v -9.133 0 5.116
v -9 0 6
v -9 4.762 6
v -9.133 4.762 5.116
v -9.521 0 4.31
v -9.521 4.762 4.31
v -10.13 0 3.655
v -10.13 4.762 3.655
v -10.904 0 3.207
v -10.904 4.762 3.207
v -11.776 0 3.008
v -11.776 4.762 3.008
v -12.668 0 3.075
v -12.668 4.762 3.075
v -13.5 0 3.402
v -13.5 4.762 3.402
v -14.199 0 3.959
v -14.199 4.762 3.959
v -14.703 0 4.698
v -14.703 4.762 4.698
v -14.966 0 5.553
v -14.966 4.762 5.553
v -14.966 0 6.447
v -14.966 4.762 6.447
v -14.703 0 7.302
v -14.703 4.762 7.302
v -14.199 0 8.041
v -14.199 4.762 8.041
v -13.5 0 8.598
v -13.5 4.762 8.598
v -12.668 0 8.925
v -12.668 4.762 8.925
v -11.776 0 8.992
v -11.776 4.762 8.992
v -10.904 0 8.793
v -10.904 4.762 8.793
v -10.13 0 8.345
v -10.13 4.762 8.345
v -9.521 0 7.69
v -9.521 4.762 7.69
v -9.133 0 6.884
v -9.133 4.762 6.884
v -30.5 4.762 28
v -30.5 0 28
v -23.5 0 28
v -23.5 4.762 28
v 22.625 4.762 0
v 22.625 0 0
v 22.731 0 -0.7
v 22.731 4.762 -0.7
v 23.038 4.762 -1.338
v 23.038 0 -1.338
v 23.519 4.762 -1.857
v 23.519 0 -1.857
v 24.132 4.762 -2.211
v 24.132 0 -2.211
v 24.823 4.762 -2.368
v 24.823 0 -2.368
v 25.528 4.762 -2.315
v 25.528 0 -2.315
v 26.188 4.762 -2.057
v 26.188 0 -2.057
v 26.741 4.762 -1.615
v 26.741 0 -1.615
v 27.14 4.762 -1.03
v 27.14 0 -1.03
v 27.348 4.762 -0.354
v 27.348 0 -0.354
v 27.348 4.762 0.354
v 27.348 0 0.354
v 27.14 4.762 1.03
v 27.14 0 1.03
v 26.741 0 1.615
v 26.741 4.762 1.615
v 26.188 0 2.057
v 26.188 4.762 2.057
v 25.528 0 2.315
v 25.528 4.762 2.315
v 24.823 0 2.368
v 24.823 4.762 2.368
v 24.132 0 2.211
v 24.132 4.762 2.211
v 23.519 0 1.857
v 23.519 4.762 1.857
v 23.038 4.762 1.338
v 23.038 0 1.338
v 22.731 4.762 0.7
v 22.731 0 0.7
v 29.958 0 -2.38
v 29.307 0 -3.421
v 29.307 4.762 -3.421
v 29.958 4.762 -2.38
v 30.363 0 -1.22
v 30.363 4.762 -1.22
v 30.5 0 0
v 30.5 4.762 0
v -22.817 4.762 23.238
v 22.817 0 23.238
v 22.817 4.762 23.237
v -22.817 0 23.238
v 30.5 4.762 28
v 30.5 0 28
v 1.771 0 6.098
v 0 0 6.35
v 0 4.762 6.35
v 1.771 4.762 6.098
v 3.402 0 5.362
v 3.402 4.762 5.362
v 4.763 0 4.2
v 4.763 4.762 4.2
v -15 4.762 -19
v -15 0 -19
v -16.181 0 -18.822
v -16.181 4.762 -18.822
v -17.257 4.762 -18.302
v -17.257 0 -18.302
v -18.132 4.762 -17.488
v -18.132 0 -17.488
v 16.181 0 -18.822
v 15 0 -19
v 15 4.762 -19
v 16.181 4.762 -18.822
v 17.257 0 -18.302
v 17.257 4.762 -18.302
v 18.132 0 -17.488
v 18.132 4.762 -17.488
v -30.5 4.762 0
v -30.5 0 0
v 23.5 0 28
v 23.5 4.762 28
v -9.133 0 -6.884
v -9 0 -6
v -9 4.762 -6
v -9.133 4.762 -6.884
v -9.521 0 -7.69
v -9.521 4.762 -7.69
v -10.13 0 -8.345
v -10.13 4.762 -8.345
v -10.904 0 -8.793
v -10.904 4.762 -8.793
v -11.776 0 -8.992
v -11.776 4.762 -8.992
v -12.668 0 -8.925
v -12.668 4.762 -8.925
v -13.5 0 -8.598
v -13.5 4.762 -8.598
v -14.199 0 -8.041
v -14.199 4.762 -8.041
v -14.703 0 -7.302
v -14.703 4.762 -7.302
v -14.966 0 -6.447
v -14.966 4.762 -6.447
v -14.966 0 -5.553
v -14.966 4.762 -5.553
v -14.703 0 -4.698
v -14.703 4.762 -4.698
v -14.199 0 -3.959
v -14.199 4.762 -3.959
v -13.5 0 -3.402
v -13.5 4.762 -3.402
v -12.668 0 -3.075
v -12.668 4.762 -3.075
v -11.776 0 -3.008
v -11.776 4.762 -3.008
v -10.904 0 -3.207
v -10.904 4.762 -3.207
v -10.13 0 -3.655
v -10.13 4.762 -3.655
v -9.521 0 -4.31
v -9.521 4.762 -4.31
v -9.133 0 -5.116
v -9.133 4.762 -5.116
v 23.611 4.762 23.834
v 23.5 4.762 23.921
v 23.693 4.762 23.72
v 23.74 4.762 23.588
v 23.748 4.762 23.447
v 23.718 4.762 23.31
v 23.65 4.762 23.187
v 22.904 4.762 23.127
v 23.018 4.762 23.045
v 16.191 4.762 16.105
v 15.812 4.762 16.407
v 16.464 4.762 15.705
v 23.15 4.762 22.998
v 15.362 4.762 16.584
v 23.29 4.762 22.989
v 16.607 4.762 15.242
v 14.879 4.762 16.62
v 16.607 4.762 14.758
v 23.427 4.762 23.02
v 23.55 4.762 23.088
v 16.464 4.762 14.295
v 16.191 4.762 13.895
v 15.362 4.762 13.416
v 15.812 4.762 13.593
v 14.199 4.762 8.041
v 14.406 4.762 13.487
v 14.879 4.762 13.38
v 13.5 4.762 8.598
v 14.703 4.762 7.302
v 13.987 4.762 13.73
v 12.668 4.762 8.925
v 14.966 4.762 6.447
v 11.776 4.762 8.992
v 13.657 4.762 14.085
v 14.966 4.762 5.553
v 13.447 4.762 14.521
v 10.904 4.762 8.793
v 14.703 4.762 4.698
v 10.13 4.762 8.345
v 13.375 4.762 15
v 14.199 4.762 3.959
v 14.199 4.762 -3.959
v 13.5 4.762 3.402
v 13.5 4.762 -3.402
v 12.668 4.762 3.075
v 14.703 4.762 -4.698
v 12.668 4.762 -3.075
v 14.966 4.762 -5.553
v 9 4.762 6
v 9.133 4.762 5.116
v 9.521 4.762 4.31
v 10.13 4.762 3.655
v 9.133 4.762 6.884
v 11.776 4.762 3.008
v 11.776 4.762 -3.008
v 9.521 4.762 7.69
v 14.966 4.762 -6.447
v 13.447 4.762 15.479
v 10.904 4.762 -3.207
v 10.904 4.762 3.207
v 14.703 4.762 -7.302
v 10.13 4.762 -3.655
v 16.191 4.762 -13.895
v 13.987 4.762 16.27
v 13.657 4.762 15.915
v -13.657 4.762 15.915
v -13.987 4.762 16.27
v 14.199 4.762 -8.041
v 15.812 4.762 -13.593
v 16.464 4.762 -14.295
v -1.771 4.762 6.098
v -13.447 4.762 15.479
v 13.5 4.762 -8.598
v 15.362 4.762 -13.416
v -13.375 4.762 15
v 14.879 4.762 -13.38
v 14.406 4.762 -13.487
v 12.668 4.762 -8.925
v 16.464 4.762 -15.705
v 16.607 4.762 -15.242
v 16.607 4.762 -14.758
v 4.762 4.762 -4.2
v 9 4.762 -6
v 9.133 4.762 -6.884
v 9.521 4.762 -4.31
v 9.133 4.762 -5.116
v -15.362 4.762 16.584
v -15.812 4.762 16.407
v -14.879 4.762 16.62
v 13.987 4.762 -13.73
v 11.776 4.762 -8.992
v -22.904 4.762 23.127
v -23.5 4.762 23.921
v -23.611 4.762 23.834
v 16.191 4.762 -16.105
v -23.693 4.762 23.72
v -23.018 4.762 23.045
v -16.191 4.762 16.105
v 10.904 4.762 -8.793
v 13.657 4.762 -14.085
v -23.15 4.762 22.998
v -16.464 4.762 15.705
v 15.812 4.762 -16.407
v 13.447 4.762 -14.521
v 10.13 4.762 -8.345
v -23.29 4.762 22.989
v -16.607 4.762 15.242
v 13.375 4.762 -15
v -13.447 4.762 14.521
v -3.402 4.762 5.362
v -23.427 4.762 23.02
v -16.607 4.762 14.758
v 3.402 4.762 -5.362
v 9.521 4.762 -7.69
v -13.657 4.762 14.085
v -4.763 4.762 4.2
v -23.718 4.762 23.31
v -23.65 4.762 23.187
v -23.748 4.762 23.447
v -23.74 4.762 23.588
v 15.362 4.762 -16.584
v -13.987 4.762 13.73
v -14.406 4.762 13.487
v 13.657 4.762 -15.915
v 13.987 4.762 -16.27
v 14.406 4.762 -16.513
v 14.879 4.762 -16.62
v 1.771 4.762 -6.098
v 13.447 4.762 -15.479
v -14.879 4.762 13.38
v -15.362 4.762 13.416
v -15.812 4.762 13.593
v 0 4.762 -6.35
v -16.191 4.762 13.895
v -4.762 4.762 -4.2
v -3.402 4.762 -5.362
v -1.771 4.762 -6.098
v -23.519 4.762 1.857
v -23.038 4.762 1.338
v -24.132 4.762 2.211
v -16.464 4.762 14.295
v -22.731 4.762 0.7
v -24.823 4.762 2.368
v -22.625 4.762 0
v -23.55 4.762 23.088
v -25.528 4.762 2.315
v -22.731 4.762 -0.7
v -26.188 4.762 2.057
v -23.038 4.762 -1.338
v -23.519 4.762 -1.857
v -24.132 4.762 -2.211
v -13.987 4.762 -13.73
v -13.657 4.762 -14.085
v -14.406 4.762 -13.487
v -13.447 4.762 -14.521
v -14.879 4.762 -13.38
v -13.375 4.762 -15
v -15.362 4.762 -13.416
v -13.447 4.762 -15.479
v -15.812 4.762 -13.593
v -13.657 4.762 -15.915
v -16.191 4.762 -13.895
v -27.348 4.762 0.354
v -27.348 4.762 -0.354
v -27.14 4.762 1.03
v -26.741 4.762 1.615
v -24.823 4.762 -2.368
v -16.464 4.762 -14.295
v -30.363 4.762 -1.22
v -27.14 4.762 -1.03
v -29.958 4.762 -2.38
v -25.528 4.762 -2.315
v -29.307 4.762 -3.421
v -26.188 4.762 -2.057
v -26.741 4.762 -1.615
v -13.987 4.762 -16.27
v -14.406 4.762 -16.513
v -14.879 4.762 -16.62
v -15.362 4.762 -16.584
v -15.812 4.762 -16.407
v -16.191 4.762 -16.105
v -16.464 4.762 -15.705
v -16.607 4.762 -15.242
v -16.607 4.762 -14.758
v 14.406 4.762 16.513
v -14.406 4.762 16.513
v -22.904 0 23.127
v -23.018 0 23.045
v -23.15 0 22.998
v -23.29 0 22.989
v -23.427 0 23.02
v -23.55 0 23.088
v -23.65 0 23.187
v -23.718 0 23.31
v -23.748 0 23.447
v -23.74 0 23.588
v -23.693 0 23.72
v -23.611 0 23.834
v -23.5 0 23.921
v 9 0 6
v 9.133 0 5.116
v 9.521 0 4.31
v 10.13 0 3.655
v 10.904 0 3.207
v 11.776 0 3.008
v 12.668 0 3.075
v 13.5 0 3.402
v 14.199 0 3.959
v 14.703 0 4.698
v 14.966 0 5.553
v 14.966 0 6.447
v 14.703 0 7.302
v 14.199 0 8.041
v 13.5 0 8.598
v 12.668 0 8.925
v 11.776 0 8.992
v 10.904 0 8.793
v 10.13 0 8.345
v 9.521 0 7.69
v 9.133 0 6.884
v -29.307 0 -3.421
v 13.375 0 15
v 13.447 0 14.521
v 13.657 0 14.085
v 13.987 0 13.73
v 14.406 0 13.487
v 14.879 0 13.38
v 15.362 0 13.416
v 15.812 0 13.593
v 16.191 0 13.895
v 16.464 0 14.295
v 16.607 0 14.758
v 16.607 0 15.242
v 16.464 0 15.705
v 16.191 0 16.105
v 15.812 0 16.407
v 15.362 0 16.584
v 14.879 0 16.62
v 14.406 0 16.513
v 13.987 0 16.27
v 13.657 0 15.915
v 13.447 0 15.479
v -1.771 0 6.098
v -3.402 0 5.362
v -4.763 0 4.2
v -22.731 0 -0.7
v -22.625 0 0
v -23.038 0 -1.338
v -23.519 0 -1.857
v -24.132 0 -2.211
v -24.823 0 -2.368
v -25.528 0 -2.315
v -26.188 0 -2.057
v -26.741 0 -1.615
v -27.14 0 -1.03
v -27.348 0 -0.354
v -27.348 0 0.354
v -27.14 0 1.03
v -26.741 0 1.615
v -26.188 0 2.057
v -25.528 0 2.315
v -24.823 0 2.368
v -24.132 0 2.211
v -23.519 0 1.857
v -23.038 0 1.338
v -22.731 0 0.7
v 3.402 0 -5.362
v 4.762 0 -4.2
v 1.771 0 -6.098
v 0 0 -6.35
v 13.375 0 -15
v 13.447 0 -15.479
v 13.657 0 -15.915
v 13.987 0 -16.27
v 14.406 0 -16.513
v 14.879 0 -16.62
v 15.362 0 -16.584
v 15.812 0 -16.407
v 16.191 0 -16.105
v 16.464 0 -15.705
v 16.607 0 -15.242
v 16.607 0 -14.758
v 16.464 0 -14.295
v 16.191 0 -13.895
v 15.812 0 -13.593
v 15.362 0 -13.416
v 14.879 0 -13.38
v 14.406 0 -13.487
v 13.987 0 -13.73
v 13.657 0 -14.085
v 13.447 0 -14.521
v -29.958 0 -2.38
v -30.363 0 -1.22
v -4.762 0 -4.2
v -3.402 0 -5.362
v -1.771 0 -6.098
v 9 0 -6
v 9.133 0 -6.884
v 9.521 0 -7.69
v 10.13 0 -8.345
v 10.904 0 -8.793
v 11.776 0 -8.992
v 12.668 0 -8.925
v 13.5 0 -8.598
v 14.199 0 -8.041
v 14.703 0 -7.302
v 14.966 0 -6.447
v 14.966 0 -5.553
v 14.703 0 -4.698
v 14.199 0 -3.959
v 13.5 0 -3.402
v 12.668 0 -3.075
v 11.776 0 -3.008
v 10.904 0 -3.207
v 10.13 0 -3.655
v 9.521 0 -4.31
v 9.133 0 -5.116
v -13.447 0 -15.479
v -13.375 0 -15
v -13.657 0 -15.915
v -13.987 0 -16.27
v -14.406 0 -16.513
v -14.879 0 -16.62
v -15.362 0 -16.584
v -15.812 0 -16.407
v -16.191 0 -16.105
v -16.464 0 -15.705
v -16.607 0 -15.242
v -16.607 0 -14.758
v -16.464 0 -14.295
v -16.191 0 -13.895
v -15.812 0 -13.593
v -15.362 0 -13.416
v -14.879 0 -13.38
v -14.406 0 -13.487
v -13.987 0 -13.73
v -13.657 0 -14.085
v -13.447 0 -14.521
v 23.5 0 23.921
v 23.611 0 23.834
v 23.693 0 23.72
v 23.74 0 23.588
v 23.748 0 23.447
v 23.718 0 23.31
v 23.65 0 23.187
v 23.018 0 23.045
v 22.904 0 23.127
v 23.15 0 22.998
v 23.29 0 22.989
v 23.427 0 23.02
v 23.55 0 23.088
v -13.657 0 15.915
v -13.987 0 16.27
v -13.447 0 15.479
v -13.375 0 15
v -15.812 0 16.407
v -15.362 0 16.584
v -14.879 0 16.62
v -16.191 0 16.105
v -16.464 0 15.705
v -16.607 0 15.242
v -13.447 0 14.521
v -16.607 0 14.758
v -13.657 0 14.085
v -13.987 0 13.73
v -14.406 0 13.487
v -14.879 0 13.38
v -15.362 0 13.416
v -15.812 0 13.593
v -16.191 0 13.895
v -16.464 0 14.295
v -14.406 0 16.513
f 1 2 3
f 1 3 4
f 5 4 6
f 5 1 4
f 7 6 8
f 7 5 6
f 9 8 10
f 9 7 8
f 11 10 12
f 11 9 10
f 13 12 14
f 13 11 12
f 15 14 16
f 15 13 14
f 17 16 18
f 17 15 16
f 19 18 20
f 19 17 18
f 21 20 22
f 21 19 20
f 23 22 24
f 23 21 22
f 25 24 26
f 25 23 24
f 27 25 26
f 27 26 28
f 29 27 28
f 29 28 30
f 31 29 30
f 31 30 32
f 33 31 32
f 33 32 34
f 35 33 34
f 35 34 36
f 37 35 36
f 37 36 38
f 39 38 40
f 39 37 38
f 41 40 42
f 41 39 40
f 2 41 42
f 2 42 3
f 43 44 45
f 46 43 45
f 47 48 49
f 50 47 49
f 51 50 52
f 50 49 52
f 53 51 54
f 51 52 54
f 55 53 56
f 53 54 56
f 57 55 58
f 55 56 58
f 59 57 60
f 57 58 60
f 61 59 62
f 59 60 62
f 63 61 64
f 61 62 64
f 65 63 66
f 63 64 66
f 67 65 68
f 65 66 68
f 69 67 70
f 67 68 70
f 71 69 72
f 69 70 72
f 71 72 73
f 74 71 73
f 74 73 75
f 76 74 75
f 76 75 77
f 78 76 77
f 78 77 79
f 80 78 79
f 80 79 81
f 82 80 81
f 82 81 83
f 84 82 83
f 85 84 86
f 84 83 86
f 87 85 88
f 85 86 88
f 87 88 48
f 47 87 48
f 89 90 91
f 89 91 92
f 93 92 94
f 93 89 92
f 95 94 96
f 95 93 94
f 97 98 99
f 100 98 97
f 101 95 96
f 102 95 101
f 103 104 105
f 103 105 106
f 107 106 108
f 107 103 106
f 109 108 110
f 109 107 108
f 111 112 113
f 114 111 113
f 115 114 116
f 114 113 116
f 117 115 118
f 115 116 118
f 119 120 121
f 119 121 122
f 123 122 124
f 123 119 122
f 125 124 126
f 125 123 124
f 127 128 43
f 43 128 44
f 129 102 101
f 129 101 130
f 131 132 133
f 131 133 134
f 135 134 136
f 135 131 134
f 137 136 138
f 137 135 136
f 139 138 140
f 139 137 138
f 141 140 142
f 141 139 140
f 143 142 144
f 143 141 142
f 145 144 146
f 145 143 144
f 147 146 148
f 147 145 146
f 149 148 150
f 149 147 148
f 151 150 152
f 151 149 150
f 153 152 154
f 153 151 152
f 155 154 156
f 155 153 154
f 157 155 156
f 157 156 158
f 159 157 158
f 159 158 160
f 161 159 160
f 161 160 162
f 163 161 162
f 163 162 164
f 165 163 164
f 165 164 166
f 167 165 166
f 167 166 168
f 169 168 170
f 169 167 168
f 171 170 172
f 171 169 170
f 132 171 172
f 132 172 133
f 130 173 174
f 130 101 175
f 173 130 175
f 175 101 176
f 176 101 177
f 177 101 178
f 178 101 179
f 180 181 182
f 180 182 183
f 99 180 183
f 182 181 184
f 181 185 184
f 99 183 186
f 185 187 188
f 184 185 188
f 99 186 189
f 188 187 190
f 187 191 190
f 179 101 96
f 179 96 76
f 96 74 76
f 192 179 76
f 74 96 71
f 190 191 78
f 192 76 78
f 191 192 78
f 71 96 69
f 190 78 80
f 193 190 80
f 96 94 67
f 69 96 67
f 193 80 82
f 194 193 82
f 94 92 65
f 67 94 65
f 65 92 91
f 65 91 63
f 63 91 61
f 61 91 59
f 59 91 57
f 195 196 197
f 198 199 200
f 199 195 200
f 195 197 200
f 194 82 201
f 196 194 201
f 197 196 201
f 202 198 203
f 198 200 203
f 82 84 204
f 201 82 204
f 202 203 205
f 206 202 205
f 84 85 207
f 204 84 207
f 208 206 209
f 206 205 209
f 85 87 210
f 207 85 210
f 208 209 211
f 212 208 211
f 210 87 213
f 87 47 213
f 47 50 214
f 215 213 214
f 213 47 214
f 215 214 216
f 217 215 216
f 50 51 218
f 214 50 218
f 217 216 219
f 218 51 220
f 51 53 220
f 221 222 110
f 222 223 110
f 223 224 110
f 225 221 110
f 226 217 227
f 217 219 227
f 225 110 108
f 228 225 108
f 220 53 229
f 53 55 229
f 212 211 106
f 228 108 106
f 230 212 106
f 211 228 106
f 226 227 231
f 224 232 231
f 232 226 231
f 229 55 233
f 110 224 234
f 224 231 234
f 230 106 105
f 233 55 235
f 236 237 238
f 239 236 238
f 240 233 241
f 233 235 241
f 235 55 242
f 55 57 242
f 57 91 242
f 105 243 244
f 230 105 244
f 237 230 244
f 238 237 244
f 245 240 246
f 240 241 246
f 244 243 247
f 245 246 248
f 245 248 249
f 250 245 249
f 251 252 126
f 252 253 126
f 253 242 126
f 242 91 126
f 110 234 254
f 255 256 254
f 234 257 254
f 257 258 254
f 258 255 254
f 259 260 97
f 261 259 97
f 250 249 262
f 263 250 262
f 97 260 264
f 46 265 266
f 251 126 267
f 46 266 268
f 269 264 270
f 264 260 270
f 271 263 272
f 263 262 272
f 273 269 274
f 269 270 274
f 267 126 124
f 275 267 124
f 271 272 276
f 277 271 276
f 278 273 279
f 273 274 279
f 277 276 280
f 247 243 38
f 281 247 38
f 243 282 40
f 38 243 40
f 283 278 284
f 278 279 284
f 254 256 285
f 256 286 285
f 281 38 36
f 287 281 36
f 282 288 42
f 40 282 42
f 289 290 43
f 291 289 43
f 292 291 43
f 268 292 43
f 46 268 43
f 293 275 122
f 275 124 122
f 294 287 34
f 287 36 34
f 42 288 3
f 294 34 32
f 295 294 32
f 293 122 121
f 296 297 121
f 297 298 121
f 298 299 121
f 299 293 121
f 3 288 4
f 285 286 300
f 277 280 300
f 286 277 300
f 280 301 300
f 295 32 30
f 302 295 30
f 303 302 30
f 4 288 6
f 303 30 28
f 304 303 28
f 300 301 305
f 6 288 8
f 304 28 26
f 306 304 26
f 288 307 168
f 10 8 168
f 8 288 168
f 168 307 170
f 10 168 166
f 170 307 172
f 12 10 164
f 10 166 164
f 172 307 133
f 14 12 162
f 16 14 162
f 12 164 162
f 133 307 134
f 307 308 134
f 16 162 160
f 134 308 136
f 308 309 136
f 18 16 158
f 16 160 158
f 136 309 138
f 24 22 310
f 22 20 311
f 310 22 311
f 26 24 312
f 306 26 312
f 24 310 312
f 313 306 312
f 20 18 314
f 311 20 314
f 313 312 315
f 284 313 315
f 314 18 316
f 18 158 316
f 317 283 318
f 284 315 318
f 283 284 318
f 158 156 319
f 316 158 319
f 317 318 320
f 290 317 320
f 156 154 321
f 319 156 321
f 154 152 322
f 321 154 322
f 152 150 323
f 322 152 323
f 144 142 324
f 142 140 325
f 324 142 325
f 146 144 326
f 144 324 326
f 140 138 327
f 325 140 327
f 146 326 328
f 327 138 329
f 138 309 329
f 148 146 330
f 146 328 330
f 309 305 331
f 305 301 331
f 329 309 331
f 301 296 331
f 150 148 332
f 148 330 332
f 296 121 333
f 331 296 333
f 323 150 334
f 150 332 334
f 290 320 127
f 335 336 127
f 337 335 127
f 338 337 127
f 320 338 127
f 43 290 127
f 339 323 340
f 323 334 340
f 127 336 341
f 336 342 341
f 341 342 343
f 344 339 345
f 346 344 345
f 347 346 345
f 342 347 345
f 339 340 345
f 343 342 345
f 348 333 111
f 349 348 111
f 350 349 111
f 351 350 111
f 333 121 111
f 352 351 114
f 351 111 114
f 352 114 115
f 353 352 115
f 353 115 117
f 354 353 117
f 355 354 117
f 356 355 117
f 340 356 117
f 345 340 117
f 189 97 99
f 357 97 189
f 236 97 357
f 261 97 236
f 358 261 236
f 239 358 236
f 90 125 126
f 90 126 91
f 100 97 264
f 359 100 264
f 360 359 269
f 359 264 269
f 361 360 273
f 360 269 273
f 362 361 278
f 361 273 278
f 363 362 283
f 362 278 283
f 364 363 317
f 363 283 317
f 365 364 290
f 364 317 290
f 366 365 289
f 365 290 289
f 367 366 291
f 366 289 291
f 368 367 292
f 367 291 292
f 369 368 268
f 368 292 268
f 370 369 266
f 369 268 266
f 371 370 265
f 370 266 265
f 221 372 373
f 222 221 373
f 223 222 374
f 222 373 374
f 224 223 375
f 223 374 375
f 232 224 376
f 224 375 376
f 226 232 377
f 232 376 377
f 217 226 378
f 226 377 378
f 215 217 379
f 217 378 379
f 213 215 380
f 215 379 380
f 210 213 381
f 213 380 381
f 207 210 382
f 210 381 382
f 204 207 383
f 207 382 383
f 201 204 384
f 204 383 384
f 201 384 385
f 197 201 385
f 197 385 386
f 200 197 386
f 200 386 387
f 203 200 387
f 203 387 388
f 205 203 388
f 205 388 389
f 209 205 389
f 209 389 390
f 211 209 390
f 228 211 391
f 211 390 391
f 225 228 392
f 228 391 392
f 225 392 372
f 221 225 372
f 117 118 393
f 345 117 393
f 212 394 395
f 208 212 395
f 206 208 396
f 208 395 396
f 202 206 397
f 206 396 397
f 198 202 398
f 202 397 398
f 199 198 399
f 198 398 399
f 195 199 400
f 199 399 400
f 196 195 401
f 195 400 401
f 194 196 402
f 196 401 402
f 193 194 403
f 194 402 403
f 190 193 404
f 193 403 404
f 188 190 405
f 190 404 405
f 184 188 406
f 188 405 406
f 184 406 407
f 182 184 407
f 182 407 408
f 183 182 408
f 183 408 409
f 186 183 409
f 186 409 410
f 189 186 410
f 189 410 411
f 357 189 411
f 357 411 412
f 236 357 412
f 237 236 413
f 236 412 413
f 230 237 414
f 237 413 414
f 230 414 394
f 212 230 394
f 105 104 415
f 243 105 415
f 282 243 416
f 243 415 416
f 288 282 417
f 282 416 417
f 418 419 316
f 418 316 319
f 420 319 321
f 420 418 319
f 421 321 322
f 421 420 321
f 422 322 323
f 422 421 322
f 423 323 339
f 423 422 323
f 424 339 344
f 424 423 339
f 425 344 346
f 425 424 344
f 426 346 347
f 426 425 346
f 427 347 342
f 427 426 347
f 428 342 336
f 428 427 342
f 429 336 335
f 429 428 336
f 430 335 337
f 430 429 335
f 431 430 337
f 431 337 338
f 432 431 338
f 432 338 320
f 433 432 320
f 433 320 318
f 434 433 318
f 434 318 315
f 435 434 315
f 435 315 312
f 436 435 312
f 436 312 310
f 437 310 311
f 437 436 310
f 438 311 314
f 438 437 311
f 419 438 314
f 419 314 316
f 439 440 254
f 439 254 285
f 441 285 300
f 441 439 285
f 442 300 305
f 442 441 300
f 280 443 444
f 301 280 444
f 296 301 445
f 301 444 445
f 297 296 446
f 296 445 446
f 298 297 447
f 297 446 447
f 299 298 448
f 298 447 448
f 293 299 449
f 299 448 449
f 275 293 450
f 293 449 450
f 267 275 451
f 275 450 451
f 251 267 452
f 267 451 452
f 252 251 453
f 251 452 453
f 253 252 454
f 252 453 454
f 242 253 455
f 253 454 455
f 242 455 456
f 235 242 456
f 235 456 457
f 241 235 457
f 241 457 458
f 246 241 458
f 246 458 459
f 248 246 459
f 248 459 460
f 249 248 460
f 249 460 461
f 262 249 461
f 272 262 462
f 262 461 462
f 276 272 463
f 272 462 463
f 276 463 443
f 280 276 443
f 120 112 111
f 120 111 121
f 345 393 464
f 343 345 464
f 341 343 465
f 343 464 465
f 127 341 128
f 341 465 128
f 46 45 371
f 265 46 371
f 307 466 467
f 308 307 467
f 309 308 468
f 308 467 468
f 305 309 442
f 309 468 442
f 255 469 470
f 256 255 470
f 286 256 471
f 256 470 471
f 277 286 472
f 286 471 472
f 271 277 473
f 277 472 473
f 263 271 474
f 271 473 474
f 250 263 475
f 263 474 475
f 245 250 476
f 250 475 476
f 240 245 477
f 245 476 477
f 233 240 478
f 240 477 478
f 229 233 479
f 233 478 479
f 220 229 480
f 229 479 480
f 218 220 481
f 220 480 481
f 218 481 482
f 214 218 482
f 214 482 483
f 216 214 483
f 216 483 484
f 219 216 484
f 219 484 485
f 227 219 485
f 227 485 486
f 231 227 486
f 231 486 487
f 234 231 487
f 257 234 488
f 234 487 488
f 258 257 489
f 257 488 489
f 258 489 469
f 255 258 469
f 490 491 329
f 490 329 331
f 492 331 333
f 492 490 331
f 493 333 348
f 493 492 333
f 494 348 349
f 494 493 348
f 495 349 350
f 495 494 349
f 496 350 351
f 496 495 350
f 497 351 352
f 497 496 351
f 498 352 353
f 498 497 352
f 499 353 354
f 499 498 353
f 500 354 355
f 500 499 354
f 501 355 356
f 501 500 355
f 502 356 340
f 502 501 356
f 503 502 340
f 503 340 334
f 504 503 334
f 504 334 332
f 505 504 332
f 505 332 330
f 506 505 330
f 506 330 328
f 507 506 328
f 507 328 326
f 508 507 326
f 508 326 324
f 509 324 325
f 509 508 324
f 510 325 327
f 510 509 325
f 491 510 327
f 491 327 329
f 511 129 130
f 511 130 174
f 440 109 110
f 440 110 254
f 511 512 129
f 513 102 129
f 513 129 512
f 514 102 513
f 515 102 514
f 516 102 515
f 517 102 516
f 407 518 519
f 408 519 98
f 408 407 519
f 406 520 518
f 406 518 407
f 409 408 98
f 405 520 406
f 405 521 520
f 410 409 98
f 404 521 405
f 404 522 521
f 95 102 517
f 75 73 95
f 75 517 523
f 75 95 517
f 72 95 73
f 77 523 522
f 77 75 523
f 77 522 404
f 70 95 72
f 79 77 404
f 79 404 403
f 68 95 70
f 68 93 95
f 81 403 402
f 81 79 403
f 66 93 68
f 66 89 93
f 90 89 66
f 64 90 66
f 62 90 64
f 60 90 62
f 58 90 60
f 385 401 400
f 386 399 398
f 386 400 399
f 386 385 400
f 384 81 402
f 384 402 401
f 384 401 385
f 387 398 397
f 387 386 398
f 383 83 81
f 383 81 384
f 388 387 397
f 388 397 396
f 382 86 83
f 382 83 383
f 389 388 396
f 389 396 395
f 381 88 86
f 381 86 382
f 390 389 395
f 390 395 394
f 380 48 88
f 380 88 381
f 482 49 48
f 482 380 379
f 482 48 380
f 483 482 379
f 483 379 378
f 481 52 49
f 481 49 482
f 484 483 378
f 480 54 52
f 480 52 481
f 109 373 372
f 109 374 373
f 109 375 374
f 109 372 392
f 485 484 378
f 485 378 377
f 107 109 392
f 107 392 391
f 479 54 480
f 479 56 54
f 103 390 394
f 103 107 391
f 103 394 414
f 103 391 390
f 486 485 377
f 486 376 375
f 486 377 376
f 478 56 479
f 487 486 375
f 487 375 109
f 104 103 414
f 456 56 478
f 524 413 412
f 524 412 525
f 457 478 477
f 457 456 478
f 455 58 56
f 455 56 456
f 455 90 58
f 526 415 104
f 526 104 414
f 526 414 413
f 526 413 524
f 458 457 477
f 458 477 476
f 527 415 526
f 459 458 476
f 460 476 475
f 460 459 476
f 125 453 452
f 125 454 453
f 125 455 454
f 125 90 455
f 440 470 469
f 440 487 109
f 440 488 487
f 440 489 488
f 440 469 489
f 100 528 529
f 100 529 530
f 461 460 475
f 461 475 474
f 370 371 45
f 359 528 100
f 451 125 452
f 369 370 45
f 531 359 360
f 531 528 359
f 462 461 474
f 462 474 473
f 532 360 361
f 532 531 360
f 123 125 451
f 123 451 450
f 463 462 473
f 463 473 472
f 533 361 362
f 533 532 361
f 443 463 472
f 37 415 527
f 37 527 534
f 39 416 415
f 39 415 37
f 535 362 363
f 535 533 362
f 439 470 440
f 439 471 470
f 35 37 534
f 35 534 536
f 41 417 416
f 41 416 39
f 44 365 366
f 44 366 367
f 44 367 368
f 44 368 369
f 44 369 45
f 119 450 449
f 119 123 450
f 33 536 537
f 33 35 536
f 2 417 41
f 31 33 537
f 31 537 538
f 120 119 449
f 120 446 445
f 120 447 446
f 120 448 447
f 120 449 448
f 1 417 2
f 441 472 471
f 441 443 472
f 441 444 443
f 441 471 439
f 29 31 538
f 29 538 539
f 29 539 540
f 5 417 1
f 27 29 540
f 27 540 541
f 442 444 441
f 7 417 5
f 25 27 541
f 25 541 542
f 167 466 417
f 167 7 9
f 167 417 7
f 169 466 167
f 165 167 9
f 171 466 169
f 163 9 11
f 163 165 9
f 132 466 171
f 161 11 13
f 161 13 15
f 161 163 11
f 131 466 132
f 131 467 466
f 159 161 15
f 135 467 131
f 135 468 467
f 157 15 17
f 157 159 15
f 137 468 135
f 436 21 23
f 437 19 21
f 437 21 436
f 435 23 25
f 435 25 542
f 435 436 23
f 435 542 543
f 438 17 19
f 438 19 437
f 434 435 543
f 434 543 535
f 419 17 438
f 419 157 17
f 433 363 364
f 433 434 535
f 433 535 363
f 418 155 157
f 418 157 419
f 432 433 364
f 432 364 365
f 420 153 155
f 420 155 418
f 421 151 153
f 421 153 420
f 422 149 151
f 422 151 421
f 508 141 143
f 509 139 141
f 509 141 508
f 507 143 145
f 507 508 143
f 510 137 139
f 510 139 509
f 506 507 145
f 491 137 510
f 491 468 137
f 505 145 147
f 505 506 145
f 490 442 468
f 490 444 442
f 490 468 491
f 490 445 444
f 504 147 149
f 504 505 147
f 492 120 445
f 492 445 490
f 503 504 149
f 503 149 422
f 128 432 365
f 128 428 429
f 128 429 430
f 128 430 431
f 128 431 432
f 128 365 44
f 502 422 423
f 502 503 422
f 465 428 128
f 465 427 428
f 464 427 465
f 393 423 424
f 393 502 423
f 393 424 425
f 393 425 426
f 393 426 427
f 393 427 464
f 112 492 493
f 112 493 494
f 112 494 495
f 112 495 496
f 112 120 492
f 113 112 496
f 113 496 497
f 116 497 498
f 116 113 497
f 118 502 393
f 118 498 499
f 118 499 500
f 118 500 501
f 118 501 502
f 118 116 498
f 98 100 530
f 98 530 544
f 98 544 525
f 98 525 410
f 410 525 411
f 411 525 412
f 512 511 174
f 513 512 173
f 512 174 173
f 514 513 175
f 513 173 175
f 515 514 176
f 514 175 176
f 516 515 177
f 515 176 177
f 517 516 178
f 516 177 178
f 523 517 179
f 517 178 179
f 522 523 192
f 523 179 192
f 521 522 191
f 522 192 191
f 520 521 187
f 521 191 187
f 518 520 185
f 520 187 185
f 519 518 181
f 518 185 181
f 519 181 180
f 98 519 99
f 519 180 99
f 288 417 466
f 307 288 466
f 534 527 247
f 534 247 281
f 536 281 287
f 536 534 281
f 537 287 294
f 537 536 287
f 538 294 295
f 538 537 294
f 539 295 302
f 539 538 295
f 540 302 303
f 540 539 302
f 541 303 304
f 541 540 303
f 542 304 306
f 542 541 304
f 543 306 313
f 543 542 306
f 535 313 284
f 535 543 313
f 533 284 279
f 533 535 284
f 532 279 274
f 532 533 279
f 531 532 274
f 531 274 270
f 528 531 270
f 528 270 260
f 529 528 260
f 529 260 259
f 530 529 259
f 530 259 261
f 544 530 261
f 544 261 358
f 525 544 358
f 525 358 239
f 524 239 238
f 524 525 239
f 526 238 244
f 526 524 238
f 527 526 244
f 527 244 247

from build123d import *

# Parameters (mm, degrees)
SKETCH1_R           = 1.625
SKETCH1_R_2         = 2.375
SKETCH1_R_3         = 3
BOSS_EXTRUDE1_DEPTH = 4.7625
SKETCH2_R           = 0.5
CUT_EXTRUDE1_DEPTH  = 5.7625


with BuildPart() as part:
    # Sketch1 → Boss-Extrude1 (new body)
    with BuildSketch(Plane(origin=(0, 0, 0), x_dir=(1, 0, 0), z_dir=(0, 1, 0))):
        with BuildLine():
            Line((-4.7625, -4.200130206), (-4.7625, 4.200130206))
            ThreePointArc((-4.7625, 4.200130206), (-2.612630206, 5.787630206), (0, 6.35))
            Line((0, 6.35), (0, 19))
            Line((0, 19), (-15, 19))
            ThreePointArc((-15, 19), (-16.738947924, 18.602229881), (-18.132045087, 17.488030058))
            Line((-18.132045087, 17.488030058), (-29.306561995, 3.42104133))
            ThreePointArc((-29.306561995, 3.42104133), (-30.193076688, 1.811616547), (-30.5, 0))
            Line((-30.5, 0), (-30.5, -28))
            Line((-30.5, -28), (-23.5, -28))
            Line((-23.5, -28), (-23.5, -23.2375))
            Line((-23.5, -23.2375), (0, -23.2375))
            Line((0, -23.2375), (0, -6.35))
            ThreePointArc((0, -6.35), (-2.612630206, -5.787630206), (-4.7625, -4.200130206))
        make_face()
        with Locations((-15, 15)):
            Circle(SKETCH1_R, mode=Mode.SUBTRACT)
        with Locations((-15, -15)):
            Circle(SKETCH1_R, mode=Mode.SUBTRACT)
        with Locations((-25, 0)):
            Circle(SKETCH1_R_2, mode=Mode.SUBTRACT)
        with Locations((-12, -6)):
            Circle(SKETCH1_R_3, mode=Mode.SUBTRACT)
        with Locations((-12, 6)):
            Circle(SKETCH1_R_3, mode=Mode.SUBTRACT)
    boss_extrude1 = extrude(amount=BOSS_EXTRUDE1_DEPTH)

    # Mirror1: Boss-Extrude1 across plane
    add(boss_extrude1.mirror(Plane(origin=(0, 4.7625, 6.35), x_dir=(0, 0, 1), z_dir=(-1, 0, 0))))

    # Sketch2 → Cut-Extrude1 (cut, through all)
    with BuildSketch(Plane(origin=(0, 4.7625, 0), x_dir=(1, 0, 0), z_dir=(0, 1, 0))):
        with Locations((-23.25, -23.4875)):
            Circle(SKETCH2_R)
        with Locations((23.25, -23.4875)):
            Circle(SKETCH2_R)
    extrude(amount=-CUT_EXTRUDE1_DEPTH, mode=Mode.SUBTRACT)


solid = part.part
